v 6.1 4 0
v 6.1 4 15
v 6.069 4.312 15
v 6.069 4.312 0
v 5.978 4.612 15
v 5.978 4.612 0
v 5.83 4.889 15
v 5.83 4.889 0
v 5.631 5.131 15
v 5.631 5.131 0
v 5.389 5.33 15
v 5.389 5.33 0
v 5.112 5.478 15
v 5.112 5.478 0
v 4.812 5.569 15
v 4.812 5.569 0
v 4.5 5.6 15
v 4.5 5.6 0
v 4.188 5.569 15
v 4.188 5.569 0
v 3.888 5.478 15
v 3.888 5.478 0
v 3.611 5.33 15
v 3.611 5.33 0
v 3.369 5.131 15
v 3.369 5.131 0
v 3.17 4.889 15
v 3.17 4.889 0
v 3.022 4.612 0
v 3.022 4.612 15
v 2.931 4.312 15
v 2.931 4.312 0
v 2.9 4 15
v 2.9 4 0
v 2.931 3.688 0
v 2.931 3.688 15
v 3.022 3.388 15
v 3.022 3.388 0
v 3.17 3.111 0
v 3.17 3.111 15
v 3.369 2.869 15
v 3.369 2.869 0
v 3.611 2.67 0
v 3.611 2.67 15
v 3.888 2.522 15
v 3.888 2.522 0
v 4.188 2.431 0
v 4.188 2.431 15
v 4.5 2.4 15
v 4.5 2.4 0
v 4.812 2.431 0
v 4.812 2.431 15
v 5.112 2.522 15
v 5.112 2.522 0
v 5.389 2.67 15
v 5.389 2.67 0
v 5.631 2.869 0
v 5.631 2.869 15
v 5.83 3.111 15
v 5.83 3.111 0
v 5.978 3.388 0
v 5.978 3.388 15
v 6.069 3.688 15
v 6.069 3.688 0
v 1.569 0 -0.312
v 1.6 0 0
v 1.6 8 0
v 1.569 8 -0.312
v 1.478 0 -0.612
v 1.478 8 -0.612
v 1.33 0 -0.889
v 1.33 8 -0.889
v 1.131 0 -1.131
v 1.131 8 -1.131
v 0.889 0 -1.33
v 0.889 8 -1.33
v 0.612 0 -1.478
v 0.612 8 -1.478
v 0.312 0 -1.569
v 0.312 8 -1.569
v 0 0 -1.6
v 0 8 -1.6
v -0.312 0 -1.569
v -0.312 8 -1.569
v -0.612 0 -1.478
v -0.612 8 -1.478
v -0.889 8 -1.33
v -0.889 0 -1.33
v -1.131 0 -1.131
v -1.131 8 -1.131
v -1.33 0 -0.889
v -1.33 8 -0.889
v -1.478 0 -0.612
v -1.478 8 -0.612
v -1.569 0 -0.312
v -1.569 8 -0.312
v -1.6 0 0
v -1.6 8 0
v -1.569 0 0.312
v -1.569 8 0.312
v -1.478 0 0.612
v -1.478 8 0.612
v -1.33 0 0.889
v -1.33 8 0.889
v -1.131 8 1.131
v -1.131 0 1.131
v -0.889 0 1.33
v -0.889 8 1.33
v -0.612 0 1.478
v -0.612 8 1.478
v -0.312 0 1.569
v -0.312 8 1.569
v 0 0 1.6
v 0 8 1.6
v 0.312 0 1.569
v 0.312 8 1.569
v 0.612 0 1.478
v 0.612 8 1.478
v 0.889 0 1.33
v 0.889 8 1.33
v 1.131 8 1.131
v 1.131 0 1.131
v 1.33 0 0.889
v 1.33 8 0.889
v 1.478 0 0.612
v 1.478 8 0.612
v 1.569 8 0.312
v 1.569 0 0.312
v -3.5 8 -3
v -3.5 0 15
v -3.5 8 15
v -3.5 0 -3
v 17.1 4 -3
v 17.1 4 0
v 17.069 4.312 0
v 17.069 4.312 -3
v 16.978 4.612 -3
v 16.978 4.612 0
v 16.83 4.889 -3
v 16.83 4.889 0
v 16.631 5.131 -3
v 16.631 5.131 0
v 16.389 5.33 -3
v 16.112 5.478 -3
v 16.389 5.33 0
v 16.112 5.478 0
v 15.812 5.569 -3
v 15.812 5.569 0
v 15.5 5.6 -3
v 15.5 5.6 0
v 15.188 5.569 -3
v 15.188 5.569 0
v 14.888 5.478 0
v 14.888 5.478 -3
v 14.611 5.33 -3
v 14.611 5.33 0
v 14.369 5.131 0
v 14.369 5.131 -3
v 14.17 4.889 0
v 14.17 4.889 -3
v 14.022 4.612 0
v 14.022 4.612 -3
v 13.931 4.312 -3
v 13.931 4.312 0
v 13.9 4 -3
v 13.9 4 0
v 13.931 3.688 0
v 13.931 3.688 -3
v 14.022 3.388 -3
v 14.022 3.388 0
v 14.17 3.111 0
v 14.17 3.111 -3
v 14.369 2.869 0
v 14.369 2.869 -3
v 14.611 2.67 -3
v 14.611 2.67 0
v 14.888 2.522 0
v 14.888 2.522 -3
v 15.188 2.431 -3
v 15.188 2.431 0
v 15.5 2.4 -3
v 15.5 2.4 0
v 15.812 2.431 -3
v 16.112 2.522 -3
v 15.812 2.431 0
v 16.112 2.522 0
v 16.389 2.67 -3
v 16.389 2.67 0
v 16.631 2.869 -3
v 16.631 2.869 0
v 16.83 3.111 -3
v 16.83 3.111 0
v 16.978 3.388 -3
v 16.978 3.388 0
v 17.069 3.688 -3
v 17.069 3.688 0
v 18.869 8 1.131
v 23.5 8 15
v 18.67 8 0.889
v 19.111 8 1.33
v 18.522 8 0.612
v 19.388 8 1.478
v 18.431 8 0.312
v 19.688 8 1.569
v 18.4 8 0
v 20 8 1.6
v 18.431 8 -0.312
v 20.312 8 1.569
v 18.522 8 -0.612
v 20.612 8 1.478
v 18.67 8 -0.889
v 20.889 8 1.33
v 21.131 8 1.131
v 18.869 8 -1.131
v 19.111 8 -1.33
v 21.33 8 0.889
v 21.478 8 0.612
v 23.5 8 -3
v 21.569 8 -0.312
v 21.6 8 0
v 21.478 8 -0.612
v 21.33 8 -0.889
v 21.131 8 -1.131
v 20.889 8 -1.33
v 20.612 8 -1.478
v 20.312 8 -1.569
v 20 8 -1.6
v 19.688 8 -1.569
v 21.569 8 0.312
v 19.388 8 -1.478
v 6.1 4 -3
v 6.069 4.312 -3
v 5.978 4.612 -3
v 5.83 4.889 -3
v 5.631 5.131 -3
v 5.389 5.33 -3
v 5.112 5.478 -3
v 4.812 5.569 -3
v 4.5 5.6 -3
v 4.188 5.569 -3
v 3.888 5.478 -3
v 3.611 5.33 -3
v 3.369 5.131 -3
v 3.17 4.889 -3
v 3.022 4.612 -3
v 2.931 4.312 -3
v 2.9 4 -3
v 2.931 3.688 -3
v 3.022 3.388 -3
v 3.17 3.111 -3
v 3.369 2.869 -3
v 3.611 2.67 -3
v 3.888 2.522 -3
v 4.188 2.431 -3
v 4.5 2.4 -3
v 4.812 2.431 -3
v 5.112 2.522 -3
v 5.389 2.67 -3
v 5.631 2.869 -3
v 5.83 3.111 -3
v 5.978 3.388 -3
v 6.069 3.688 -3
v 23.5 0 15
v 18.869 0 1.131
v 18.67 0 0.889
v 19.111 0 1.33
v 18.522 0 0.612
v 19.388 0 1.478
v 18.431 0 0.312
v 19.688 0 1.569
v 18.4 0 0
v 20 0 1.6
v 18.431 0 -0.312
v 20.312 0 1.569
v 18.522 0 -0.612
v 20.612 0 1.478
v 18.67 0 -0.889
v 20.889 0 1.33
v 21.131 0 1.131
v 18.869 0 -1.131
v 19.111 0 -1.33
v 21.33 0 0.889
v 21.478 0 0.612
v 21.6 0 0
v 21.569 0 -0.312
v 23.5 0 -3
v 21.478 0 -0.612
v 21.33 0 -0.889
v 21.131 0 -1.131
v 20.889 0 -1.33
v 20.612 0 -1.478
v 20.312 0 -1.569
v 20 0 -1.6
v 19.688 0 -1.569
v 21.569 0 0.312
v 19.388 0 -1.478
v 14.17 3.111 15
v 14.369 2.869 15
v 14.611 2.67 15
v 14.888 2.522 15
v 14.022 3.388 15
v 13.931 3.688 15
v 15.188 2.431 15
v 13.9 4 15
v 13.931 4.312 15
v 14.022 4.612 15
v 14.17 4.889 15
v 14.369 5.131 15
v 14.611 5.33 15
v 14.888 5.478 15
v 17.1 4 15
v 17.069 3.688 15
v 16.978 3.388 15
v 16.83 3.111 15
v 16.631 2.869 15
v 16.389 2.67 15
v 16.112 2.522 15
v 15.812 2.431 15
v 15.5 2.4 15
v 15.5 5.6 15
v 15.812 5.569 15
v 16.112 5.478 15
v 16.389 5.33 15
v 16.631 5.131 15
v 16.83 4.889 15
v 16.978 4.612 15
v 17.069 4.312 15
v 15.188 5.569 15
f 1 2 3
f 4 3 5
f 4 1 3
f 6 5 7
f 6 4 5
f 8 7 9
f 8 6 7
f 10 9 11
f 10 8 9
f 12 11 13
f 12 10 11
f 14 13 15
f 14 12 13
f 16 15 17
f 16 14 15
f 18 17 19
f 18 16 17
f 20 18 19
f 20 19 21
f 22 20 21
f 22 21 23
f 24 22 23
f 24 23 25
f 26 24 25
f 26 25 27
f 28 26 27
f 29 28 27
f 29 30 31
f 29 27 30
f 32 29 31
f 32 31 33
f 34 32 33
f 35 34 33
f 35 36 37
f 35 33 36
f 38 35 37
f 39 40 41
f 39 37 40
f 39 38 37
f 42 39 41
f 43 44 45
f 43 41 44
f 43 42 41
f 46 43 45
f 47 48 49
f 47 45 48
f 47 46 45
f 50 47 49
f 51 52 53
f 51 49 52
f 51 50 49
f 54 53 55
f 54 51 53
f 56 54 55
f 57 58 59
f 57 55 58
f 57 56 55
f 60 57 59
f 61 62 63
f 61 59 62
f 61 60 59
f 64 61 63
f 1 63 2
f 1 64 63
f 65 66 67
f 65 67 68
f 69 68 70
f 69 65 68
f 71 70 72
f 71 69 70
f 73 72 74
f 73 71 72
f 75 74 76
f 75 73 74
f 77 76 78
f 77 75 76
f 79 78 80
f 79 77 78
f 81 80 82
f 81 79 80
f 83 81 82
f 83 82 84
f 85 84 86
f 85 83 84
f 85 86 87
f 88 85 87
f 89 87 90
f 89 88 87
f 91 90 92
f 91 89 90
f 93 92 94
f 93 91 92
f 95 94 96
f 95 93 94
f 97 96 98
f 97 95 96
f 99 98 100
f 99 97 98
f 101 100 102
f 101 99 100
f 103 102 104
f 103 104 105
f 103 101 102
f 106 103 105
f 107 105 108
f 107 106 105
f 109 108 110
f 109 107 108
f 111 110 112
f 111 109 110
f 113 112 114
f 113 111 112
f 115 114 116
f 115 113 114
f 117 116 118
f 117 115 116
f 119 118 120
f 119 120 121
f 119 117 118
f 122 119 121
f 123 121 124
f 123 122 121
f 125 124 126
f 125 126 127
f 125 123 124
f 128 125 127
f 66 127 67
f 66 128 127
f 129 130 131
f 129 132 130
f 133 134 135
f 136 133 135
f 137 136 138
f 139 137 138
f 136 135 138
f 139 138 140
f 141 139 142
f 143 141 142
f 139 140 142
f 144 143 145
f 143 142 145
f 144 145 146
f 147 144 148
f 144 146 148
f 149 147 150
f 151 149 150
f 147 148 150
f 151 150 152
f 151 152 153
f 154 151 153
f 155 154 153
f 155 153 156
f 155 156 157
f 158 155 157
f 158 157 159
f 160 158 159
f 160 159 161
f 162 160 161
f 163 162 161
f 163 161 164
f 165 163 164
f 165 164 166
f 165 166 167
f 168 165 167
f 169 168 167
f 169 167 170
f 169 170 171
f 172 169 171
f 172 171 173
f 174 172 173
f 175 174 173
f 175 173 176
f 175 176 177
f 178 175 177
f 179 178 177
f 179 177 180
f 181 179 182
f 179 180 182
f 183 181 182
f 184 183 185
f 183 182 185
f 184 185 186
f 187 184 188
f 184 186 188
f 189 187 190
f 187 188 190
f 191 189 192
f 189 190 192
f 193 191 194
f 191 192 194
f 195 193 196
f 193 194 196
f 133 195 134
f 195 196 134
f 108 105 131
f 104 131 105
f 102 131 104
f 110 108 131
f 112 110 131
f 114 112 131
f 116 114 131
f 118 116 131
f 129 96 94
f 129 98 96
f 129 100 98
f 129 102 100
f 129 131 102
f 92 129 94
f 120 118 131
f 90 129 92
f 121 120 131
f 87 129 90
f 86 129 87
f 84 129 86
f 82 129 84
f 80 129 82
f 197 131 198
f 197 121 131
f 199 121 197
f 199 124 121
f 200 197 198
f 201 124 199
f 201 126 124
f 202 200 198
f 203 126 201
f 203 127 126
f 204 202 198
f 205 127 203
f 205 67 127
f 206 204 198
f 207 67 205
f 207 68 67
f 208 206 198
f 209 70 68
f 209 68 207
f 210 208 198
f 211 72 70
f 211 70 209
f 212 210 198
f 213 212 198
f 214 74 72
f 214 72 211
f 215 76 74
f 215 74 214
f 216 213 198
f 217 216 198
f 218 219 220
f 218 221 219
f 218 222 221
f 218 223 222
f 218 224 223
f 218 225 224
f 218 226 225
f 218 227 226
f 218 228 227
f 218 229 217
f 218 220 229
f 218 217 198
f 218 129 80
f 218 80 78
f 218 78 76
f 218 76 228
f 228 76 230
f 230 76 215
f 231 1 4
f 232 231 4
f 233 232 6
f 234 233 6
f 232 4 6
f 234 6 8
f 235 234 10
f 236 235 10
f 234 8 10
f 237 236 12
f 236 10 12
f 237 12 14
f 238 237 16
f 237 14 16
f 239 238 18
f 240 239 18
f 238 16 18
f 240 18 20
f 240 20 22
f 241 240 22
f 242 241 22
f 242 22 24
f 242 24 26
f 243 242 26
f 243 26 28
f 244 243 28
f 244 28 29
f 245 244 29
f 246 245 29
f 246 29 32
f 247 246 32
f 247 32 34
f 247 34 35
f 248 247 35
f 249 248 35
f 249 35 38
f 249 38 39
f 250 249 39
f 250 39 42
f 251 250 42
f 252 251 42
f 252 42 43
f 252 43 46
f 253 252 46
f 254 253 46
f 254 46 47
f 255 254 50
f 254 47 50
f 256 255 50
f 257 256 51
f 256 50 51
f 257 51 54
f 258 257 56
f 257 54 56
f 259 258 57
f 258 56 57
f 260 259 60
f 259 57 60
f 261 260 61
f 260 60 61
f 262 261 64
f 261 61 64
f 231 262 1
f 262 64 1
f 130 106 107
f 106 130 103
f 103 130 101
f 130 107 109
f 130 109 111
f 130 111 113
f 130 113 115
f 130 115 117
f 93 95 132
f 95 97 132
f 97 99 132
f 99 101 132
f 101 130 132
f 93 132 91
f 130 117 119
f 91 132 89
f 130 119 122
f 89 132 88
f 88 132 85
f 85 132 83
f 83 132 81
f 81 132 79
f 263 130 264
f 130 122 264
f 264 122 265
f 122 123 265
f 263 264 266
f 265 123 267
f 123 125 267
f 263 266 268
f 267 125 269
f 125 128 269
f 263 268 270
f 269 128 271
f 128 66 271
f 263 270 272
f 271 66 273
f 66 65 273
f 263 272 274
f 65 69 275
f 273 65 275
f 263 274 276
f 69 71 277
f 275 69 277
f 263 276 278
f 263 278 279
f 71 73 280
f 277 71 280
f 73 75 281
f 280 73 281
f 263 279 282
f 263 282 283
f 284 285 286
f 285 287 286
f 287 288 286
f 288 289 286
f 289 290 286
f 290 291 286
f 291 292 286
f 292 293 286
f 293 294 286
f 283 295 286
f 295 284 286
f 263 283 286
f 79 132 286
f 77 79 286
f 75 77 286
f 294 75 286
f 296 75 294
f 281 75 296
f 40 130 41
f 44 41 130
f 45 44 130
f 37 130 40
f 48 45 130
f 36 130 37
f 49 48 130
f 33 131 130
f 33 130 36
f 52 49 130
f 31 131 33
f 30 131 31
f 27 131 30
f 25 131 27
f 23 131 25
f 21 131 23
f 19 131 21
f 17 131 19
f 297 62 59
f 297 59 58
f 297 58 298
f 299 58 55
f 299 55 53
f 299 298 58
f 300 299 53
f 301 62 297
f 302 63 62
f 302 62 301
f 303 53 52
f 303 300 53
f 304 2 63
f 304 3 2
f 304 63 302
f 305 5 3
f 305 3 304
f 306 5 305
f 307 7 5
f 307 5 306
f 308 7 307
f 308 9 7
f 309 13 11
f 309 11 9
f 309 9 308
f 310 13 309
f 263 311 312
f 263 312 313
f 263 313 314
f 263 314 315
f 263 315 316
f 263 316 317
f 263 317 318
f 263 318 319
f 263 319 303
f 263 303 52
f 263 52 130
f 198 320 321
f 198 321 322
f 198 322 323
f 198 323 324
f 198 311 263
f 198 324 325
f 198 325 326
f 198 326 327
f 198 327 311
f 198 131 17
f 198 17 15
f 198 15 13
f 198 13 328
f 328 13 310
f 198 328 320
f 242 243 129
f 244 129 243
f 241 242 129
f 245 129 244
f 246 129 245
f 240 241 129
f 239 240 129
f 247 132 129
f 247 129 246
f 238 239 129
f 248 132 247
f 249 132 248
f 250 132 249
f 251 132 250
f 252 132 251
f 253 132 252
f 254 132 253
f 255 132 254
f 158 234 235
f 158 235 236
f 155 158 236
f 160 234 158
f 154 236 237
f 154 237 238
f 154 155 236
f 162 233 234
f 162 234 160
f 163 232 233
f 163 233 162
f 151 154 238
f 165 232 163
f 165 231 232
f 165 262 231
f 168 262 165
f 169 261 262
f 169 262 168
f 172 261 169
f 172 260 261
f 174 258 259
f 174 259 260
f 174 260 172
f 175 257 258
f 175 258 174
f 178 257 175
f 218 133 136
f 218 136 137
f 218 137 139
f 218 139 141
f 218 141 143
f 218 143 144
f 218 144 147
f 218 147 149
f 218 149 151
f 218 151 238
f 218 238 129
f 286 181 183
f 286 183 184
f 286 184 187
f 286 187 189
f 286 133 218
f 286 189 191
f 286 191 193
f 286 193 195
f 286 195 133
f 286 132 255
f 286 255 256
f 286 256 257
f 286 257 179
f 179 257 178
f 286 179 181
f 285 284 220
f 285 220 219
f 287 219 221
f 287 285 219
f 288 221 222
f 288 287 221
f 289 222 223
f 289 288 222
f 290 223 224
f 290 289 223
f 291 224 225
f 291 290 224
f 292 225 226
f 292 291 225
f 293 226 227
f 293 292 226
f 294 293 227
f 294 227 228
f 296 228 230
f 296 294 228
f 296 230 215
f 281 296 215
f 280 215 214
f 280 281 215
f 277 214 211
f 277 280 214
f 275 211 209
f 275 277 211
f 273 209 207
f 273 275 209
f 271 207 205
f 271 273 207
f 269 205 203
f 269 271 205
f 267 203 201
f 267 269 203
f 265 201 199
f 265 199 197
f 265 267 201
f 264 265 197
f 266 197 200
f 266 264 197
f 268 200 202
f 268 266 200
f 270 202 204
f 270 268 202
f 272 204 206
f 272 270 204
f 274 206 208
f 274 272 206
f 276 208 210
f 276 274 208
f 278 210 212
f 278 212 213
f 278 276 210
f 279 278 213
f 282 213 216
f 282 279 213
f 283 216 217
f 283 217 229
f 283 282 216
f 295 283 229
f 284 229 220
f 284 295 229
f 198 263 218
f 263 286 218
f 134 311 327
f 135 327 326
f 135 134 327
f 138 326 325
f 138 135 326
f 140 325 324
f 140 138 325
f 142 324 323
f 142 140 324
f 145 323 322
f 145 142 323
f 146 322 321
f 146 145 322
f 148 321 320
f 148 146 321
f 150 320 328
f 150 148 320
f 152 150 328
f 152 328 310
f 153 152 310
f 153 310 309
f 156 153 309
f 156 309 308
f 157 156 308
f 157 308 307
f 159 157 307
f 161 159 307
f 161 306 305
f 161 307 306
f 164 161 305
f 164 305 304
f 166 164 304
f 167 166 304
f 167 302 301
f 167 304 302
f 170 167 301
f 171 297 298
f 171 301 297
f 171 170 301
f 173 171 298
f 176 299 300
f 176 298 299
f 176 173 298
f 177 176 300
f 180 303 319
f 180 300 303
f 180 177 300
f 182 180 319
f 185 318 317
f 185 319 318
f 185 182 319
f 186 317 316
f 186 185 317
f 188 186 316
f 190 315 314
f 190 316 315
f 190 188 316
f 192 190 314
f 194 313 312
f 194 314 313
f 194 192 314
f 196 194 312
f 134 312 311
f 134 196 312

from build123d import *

# Parameters (mm, degrees)
SKETCH1_W               = 27
SKETCH1_H               = 6
SKETCH1_R               = 1.6
BOSS_EXTRUDE1_DEPTH     = 8
SKETCH3_W               = 27
SKETCH3_H               = 8
BOSS_EXTRUDE2_DEPTH     = 12
SKETCH2_R               = 1.6
CUT_EXTRUDE1_DEPTH      = 16
CUT_EXTRUDE1_DEPTH_BACK = 4


with BuildPart() as part:
    # Sketch1 → Boss-Extrude1 (new body)
    with BuildSketch(Plane(origin=(0, 0, 0), x_dir=(1, 0, 0), z_dir=(0, 1, 0))):
        with Locations((10, 0)):
            Rectangle(SKETCH1_W, SKETCH1_H)
        Circle(SKETCH1_R, mode=Mode.SUBTRACT)
        with Locations((20, 0)):
            Circle(SKETCH1_R, mode=Mode.SUBTRACT)
    extrude(amount=BOSS_EXTRUDE1_DEPTH)

    # Sketch3 → Boss-Extrude2 (add)
    with BuildSketch(Plane.XY.offset(3)):
        with Locations((10, 4)):
            Rectangle(SKETCH3_W, SKETCH3_H)
    extrude(amount=BOSS_EXTRUDE2_DEPTH)

    # Sketch2 → Cut-Extrude1 (cut, two sides)
    with BuildSketch(Plane.XY) as cut_extrude1_sk:
        with Locations((4.5, 4)):
            Circle(SKETCH2_R)
        with Locations((15.5, 4)):
            Circle(SKETCH2_R)
    extrude(amount=CUT_EXTRUDE1_DEPTH, mode=Mode.SUBTRACT)
    extrude(cut_extrude1_sk.sketch, amount=-CUT_EXTRUDE1_DEPTH_BACK, mode=Mode.SUBTRACT)


solid = part.part
